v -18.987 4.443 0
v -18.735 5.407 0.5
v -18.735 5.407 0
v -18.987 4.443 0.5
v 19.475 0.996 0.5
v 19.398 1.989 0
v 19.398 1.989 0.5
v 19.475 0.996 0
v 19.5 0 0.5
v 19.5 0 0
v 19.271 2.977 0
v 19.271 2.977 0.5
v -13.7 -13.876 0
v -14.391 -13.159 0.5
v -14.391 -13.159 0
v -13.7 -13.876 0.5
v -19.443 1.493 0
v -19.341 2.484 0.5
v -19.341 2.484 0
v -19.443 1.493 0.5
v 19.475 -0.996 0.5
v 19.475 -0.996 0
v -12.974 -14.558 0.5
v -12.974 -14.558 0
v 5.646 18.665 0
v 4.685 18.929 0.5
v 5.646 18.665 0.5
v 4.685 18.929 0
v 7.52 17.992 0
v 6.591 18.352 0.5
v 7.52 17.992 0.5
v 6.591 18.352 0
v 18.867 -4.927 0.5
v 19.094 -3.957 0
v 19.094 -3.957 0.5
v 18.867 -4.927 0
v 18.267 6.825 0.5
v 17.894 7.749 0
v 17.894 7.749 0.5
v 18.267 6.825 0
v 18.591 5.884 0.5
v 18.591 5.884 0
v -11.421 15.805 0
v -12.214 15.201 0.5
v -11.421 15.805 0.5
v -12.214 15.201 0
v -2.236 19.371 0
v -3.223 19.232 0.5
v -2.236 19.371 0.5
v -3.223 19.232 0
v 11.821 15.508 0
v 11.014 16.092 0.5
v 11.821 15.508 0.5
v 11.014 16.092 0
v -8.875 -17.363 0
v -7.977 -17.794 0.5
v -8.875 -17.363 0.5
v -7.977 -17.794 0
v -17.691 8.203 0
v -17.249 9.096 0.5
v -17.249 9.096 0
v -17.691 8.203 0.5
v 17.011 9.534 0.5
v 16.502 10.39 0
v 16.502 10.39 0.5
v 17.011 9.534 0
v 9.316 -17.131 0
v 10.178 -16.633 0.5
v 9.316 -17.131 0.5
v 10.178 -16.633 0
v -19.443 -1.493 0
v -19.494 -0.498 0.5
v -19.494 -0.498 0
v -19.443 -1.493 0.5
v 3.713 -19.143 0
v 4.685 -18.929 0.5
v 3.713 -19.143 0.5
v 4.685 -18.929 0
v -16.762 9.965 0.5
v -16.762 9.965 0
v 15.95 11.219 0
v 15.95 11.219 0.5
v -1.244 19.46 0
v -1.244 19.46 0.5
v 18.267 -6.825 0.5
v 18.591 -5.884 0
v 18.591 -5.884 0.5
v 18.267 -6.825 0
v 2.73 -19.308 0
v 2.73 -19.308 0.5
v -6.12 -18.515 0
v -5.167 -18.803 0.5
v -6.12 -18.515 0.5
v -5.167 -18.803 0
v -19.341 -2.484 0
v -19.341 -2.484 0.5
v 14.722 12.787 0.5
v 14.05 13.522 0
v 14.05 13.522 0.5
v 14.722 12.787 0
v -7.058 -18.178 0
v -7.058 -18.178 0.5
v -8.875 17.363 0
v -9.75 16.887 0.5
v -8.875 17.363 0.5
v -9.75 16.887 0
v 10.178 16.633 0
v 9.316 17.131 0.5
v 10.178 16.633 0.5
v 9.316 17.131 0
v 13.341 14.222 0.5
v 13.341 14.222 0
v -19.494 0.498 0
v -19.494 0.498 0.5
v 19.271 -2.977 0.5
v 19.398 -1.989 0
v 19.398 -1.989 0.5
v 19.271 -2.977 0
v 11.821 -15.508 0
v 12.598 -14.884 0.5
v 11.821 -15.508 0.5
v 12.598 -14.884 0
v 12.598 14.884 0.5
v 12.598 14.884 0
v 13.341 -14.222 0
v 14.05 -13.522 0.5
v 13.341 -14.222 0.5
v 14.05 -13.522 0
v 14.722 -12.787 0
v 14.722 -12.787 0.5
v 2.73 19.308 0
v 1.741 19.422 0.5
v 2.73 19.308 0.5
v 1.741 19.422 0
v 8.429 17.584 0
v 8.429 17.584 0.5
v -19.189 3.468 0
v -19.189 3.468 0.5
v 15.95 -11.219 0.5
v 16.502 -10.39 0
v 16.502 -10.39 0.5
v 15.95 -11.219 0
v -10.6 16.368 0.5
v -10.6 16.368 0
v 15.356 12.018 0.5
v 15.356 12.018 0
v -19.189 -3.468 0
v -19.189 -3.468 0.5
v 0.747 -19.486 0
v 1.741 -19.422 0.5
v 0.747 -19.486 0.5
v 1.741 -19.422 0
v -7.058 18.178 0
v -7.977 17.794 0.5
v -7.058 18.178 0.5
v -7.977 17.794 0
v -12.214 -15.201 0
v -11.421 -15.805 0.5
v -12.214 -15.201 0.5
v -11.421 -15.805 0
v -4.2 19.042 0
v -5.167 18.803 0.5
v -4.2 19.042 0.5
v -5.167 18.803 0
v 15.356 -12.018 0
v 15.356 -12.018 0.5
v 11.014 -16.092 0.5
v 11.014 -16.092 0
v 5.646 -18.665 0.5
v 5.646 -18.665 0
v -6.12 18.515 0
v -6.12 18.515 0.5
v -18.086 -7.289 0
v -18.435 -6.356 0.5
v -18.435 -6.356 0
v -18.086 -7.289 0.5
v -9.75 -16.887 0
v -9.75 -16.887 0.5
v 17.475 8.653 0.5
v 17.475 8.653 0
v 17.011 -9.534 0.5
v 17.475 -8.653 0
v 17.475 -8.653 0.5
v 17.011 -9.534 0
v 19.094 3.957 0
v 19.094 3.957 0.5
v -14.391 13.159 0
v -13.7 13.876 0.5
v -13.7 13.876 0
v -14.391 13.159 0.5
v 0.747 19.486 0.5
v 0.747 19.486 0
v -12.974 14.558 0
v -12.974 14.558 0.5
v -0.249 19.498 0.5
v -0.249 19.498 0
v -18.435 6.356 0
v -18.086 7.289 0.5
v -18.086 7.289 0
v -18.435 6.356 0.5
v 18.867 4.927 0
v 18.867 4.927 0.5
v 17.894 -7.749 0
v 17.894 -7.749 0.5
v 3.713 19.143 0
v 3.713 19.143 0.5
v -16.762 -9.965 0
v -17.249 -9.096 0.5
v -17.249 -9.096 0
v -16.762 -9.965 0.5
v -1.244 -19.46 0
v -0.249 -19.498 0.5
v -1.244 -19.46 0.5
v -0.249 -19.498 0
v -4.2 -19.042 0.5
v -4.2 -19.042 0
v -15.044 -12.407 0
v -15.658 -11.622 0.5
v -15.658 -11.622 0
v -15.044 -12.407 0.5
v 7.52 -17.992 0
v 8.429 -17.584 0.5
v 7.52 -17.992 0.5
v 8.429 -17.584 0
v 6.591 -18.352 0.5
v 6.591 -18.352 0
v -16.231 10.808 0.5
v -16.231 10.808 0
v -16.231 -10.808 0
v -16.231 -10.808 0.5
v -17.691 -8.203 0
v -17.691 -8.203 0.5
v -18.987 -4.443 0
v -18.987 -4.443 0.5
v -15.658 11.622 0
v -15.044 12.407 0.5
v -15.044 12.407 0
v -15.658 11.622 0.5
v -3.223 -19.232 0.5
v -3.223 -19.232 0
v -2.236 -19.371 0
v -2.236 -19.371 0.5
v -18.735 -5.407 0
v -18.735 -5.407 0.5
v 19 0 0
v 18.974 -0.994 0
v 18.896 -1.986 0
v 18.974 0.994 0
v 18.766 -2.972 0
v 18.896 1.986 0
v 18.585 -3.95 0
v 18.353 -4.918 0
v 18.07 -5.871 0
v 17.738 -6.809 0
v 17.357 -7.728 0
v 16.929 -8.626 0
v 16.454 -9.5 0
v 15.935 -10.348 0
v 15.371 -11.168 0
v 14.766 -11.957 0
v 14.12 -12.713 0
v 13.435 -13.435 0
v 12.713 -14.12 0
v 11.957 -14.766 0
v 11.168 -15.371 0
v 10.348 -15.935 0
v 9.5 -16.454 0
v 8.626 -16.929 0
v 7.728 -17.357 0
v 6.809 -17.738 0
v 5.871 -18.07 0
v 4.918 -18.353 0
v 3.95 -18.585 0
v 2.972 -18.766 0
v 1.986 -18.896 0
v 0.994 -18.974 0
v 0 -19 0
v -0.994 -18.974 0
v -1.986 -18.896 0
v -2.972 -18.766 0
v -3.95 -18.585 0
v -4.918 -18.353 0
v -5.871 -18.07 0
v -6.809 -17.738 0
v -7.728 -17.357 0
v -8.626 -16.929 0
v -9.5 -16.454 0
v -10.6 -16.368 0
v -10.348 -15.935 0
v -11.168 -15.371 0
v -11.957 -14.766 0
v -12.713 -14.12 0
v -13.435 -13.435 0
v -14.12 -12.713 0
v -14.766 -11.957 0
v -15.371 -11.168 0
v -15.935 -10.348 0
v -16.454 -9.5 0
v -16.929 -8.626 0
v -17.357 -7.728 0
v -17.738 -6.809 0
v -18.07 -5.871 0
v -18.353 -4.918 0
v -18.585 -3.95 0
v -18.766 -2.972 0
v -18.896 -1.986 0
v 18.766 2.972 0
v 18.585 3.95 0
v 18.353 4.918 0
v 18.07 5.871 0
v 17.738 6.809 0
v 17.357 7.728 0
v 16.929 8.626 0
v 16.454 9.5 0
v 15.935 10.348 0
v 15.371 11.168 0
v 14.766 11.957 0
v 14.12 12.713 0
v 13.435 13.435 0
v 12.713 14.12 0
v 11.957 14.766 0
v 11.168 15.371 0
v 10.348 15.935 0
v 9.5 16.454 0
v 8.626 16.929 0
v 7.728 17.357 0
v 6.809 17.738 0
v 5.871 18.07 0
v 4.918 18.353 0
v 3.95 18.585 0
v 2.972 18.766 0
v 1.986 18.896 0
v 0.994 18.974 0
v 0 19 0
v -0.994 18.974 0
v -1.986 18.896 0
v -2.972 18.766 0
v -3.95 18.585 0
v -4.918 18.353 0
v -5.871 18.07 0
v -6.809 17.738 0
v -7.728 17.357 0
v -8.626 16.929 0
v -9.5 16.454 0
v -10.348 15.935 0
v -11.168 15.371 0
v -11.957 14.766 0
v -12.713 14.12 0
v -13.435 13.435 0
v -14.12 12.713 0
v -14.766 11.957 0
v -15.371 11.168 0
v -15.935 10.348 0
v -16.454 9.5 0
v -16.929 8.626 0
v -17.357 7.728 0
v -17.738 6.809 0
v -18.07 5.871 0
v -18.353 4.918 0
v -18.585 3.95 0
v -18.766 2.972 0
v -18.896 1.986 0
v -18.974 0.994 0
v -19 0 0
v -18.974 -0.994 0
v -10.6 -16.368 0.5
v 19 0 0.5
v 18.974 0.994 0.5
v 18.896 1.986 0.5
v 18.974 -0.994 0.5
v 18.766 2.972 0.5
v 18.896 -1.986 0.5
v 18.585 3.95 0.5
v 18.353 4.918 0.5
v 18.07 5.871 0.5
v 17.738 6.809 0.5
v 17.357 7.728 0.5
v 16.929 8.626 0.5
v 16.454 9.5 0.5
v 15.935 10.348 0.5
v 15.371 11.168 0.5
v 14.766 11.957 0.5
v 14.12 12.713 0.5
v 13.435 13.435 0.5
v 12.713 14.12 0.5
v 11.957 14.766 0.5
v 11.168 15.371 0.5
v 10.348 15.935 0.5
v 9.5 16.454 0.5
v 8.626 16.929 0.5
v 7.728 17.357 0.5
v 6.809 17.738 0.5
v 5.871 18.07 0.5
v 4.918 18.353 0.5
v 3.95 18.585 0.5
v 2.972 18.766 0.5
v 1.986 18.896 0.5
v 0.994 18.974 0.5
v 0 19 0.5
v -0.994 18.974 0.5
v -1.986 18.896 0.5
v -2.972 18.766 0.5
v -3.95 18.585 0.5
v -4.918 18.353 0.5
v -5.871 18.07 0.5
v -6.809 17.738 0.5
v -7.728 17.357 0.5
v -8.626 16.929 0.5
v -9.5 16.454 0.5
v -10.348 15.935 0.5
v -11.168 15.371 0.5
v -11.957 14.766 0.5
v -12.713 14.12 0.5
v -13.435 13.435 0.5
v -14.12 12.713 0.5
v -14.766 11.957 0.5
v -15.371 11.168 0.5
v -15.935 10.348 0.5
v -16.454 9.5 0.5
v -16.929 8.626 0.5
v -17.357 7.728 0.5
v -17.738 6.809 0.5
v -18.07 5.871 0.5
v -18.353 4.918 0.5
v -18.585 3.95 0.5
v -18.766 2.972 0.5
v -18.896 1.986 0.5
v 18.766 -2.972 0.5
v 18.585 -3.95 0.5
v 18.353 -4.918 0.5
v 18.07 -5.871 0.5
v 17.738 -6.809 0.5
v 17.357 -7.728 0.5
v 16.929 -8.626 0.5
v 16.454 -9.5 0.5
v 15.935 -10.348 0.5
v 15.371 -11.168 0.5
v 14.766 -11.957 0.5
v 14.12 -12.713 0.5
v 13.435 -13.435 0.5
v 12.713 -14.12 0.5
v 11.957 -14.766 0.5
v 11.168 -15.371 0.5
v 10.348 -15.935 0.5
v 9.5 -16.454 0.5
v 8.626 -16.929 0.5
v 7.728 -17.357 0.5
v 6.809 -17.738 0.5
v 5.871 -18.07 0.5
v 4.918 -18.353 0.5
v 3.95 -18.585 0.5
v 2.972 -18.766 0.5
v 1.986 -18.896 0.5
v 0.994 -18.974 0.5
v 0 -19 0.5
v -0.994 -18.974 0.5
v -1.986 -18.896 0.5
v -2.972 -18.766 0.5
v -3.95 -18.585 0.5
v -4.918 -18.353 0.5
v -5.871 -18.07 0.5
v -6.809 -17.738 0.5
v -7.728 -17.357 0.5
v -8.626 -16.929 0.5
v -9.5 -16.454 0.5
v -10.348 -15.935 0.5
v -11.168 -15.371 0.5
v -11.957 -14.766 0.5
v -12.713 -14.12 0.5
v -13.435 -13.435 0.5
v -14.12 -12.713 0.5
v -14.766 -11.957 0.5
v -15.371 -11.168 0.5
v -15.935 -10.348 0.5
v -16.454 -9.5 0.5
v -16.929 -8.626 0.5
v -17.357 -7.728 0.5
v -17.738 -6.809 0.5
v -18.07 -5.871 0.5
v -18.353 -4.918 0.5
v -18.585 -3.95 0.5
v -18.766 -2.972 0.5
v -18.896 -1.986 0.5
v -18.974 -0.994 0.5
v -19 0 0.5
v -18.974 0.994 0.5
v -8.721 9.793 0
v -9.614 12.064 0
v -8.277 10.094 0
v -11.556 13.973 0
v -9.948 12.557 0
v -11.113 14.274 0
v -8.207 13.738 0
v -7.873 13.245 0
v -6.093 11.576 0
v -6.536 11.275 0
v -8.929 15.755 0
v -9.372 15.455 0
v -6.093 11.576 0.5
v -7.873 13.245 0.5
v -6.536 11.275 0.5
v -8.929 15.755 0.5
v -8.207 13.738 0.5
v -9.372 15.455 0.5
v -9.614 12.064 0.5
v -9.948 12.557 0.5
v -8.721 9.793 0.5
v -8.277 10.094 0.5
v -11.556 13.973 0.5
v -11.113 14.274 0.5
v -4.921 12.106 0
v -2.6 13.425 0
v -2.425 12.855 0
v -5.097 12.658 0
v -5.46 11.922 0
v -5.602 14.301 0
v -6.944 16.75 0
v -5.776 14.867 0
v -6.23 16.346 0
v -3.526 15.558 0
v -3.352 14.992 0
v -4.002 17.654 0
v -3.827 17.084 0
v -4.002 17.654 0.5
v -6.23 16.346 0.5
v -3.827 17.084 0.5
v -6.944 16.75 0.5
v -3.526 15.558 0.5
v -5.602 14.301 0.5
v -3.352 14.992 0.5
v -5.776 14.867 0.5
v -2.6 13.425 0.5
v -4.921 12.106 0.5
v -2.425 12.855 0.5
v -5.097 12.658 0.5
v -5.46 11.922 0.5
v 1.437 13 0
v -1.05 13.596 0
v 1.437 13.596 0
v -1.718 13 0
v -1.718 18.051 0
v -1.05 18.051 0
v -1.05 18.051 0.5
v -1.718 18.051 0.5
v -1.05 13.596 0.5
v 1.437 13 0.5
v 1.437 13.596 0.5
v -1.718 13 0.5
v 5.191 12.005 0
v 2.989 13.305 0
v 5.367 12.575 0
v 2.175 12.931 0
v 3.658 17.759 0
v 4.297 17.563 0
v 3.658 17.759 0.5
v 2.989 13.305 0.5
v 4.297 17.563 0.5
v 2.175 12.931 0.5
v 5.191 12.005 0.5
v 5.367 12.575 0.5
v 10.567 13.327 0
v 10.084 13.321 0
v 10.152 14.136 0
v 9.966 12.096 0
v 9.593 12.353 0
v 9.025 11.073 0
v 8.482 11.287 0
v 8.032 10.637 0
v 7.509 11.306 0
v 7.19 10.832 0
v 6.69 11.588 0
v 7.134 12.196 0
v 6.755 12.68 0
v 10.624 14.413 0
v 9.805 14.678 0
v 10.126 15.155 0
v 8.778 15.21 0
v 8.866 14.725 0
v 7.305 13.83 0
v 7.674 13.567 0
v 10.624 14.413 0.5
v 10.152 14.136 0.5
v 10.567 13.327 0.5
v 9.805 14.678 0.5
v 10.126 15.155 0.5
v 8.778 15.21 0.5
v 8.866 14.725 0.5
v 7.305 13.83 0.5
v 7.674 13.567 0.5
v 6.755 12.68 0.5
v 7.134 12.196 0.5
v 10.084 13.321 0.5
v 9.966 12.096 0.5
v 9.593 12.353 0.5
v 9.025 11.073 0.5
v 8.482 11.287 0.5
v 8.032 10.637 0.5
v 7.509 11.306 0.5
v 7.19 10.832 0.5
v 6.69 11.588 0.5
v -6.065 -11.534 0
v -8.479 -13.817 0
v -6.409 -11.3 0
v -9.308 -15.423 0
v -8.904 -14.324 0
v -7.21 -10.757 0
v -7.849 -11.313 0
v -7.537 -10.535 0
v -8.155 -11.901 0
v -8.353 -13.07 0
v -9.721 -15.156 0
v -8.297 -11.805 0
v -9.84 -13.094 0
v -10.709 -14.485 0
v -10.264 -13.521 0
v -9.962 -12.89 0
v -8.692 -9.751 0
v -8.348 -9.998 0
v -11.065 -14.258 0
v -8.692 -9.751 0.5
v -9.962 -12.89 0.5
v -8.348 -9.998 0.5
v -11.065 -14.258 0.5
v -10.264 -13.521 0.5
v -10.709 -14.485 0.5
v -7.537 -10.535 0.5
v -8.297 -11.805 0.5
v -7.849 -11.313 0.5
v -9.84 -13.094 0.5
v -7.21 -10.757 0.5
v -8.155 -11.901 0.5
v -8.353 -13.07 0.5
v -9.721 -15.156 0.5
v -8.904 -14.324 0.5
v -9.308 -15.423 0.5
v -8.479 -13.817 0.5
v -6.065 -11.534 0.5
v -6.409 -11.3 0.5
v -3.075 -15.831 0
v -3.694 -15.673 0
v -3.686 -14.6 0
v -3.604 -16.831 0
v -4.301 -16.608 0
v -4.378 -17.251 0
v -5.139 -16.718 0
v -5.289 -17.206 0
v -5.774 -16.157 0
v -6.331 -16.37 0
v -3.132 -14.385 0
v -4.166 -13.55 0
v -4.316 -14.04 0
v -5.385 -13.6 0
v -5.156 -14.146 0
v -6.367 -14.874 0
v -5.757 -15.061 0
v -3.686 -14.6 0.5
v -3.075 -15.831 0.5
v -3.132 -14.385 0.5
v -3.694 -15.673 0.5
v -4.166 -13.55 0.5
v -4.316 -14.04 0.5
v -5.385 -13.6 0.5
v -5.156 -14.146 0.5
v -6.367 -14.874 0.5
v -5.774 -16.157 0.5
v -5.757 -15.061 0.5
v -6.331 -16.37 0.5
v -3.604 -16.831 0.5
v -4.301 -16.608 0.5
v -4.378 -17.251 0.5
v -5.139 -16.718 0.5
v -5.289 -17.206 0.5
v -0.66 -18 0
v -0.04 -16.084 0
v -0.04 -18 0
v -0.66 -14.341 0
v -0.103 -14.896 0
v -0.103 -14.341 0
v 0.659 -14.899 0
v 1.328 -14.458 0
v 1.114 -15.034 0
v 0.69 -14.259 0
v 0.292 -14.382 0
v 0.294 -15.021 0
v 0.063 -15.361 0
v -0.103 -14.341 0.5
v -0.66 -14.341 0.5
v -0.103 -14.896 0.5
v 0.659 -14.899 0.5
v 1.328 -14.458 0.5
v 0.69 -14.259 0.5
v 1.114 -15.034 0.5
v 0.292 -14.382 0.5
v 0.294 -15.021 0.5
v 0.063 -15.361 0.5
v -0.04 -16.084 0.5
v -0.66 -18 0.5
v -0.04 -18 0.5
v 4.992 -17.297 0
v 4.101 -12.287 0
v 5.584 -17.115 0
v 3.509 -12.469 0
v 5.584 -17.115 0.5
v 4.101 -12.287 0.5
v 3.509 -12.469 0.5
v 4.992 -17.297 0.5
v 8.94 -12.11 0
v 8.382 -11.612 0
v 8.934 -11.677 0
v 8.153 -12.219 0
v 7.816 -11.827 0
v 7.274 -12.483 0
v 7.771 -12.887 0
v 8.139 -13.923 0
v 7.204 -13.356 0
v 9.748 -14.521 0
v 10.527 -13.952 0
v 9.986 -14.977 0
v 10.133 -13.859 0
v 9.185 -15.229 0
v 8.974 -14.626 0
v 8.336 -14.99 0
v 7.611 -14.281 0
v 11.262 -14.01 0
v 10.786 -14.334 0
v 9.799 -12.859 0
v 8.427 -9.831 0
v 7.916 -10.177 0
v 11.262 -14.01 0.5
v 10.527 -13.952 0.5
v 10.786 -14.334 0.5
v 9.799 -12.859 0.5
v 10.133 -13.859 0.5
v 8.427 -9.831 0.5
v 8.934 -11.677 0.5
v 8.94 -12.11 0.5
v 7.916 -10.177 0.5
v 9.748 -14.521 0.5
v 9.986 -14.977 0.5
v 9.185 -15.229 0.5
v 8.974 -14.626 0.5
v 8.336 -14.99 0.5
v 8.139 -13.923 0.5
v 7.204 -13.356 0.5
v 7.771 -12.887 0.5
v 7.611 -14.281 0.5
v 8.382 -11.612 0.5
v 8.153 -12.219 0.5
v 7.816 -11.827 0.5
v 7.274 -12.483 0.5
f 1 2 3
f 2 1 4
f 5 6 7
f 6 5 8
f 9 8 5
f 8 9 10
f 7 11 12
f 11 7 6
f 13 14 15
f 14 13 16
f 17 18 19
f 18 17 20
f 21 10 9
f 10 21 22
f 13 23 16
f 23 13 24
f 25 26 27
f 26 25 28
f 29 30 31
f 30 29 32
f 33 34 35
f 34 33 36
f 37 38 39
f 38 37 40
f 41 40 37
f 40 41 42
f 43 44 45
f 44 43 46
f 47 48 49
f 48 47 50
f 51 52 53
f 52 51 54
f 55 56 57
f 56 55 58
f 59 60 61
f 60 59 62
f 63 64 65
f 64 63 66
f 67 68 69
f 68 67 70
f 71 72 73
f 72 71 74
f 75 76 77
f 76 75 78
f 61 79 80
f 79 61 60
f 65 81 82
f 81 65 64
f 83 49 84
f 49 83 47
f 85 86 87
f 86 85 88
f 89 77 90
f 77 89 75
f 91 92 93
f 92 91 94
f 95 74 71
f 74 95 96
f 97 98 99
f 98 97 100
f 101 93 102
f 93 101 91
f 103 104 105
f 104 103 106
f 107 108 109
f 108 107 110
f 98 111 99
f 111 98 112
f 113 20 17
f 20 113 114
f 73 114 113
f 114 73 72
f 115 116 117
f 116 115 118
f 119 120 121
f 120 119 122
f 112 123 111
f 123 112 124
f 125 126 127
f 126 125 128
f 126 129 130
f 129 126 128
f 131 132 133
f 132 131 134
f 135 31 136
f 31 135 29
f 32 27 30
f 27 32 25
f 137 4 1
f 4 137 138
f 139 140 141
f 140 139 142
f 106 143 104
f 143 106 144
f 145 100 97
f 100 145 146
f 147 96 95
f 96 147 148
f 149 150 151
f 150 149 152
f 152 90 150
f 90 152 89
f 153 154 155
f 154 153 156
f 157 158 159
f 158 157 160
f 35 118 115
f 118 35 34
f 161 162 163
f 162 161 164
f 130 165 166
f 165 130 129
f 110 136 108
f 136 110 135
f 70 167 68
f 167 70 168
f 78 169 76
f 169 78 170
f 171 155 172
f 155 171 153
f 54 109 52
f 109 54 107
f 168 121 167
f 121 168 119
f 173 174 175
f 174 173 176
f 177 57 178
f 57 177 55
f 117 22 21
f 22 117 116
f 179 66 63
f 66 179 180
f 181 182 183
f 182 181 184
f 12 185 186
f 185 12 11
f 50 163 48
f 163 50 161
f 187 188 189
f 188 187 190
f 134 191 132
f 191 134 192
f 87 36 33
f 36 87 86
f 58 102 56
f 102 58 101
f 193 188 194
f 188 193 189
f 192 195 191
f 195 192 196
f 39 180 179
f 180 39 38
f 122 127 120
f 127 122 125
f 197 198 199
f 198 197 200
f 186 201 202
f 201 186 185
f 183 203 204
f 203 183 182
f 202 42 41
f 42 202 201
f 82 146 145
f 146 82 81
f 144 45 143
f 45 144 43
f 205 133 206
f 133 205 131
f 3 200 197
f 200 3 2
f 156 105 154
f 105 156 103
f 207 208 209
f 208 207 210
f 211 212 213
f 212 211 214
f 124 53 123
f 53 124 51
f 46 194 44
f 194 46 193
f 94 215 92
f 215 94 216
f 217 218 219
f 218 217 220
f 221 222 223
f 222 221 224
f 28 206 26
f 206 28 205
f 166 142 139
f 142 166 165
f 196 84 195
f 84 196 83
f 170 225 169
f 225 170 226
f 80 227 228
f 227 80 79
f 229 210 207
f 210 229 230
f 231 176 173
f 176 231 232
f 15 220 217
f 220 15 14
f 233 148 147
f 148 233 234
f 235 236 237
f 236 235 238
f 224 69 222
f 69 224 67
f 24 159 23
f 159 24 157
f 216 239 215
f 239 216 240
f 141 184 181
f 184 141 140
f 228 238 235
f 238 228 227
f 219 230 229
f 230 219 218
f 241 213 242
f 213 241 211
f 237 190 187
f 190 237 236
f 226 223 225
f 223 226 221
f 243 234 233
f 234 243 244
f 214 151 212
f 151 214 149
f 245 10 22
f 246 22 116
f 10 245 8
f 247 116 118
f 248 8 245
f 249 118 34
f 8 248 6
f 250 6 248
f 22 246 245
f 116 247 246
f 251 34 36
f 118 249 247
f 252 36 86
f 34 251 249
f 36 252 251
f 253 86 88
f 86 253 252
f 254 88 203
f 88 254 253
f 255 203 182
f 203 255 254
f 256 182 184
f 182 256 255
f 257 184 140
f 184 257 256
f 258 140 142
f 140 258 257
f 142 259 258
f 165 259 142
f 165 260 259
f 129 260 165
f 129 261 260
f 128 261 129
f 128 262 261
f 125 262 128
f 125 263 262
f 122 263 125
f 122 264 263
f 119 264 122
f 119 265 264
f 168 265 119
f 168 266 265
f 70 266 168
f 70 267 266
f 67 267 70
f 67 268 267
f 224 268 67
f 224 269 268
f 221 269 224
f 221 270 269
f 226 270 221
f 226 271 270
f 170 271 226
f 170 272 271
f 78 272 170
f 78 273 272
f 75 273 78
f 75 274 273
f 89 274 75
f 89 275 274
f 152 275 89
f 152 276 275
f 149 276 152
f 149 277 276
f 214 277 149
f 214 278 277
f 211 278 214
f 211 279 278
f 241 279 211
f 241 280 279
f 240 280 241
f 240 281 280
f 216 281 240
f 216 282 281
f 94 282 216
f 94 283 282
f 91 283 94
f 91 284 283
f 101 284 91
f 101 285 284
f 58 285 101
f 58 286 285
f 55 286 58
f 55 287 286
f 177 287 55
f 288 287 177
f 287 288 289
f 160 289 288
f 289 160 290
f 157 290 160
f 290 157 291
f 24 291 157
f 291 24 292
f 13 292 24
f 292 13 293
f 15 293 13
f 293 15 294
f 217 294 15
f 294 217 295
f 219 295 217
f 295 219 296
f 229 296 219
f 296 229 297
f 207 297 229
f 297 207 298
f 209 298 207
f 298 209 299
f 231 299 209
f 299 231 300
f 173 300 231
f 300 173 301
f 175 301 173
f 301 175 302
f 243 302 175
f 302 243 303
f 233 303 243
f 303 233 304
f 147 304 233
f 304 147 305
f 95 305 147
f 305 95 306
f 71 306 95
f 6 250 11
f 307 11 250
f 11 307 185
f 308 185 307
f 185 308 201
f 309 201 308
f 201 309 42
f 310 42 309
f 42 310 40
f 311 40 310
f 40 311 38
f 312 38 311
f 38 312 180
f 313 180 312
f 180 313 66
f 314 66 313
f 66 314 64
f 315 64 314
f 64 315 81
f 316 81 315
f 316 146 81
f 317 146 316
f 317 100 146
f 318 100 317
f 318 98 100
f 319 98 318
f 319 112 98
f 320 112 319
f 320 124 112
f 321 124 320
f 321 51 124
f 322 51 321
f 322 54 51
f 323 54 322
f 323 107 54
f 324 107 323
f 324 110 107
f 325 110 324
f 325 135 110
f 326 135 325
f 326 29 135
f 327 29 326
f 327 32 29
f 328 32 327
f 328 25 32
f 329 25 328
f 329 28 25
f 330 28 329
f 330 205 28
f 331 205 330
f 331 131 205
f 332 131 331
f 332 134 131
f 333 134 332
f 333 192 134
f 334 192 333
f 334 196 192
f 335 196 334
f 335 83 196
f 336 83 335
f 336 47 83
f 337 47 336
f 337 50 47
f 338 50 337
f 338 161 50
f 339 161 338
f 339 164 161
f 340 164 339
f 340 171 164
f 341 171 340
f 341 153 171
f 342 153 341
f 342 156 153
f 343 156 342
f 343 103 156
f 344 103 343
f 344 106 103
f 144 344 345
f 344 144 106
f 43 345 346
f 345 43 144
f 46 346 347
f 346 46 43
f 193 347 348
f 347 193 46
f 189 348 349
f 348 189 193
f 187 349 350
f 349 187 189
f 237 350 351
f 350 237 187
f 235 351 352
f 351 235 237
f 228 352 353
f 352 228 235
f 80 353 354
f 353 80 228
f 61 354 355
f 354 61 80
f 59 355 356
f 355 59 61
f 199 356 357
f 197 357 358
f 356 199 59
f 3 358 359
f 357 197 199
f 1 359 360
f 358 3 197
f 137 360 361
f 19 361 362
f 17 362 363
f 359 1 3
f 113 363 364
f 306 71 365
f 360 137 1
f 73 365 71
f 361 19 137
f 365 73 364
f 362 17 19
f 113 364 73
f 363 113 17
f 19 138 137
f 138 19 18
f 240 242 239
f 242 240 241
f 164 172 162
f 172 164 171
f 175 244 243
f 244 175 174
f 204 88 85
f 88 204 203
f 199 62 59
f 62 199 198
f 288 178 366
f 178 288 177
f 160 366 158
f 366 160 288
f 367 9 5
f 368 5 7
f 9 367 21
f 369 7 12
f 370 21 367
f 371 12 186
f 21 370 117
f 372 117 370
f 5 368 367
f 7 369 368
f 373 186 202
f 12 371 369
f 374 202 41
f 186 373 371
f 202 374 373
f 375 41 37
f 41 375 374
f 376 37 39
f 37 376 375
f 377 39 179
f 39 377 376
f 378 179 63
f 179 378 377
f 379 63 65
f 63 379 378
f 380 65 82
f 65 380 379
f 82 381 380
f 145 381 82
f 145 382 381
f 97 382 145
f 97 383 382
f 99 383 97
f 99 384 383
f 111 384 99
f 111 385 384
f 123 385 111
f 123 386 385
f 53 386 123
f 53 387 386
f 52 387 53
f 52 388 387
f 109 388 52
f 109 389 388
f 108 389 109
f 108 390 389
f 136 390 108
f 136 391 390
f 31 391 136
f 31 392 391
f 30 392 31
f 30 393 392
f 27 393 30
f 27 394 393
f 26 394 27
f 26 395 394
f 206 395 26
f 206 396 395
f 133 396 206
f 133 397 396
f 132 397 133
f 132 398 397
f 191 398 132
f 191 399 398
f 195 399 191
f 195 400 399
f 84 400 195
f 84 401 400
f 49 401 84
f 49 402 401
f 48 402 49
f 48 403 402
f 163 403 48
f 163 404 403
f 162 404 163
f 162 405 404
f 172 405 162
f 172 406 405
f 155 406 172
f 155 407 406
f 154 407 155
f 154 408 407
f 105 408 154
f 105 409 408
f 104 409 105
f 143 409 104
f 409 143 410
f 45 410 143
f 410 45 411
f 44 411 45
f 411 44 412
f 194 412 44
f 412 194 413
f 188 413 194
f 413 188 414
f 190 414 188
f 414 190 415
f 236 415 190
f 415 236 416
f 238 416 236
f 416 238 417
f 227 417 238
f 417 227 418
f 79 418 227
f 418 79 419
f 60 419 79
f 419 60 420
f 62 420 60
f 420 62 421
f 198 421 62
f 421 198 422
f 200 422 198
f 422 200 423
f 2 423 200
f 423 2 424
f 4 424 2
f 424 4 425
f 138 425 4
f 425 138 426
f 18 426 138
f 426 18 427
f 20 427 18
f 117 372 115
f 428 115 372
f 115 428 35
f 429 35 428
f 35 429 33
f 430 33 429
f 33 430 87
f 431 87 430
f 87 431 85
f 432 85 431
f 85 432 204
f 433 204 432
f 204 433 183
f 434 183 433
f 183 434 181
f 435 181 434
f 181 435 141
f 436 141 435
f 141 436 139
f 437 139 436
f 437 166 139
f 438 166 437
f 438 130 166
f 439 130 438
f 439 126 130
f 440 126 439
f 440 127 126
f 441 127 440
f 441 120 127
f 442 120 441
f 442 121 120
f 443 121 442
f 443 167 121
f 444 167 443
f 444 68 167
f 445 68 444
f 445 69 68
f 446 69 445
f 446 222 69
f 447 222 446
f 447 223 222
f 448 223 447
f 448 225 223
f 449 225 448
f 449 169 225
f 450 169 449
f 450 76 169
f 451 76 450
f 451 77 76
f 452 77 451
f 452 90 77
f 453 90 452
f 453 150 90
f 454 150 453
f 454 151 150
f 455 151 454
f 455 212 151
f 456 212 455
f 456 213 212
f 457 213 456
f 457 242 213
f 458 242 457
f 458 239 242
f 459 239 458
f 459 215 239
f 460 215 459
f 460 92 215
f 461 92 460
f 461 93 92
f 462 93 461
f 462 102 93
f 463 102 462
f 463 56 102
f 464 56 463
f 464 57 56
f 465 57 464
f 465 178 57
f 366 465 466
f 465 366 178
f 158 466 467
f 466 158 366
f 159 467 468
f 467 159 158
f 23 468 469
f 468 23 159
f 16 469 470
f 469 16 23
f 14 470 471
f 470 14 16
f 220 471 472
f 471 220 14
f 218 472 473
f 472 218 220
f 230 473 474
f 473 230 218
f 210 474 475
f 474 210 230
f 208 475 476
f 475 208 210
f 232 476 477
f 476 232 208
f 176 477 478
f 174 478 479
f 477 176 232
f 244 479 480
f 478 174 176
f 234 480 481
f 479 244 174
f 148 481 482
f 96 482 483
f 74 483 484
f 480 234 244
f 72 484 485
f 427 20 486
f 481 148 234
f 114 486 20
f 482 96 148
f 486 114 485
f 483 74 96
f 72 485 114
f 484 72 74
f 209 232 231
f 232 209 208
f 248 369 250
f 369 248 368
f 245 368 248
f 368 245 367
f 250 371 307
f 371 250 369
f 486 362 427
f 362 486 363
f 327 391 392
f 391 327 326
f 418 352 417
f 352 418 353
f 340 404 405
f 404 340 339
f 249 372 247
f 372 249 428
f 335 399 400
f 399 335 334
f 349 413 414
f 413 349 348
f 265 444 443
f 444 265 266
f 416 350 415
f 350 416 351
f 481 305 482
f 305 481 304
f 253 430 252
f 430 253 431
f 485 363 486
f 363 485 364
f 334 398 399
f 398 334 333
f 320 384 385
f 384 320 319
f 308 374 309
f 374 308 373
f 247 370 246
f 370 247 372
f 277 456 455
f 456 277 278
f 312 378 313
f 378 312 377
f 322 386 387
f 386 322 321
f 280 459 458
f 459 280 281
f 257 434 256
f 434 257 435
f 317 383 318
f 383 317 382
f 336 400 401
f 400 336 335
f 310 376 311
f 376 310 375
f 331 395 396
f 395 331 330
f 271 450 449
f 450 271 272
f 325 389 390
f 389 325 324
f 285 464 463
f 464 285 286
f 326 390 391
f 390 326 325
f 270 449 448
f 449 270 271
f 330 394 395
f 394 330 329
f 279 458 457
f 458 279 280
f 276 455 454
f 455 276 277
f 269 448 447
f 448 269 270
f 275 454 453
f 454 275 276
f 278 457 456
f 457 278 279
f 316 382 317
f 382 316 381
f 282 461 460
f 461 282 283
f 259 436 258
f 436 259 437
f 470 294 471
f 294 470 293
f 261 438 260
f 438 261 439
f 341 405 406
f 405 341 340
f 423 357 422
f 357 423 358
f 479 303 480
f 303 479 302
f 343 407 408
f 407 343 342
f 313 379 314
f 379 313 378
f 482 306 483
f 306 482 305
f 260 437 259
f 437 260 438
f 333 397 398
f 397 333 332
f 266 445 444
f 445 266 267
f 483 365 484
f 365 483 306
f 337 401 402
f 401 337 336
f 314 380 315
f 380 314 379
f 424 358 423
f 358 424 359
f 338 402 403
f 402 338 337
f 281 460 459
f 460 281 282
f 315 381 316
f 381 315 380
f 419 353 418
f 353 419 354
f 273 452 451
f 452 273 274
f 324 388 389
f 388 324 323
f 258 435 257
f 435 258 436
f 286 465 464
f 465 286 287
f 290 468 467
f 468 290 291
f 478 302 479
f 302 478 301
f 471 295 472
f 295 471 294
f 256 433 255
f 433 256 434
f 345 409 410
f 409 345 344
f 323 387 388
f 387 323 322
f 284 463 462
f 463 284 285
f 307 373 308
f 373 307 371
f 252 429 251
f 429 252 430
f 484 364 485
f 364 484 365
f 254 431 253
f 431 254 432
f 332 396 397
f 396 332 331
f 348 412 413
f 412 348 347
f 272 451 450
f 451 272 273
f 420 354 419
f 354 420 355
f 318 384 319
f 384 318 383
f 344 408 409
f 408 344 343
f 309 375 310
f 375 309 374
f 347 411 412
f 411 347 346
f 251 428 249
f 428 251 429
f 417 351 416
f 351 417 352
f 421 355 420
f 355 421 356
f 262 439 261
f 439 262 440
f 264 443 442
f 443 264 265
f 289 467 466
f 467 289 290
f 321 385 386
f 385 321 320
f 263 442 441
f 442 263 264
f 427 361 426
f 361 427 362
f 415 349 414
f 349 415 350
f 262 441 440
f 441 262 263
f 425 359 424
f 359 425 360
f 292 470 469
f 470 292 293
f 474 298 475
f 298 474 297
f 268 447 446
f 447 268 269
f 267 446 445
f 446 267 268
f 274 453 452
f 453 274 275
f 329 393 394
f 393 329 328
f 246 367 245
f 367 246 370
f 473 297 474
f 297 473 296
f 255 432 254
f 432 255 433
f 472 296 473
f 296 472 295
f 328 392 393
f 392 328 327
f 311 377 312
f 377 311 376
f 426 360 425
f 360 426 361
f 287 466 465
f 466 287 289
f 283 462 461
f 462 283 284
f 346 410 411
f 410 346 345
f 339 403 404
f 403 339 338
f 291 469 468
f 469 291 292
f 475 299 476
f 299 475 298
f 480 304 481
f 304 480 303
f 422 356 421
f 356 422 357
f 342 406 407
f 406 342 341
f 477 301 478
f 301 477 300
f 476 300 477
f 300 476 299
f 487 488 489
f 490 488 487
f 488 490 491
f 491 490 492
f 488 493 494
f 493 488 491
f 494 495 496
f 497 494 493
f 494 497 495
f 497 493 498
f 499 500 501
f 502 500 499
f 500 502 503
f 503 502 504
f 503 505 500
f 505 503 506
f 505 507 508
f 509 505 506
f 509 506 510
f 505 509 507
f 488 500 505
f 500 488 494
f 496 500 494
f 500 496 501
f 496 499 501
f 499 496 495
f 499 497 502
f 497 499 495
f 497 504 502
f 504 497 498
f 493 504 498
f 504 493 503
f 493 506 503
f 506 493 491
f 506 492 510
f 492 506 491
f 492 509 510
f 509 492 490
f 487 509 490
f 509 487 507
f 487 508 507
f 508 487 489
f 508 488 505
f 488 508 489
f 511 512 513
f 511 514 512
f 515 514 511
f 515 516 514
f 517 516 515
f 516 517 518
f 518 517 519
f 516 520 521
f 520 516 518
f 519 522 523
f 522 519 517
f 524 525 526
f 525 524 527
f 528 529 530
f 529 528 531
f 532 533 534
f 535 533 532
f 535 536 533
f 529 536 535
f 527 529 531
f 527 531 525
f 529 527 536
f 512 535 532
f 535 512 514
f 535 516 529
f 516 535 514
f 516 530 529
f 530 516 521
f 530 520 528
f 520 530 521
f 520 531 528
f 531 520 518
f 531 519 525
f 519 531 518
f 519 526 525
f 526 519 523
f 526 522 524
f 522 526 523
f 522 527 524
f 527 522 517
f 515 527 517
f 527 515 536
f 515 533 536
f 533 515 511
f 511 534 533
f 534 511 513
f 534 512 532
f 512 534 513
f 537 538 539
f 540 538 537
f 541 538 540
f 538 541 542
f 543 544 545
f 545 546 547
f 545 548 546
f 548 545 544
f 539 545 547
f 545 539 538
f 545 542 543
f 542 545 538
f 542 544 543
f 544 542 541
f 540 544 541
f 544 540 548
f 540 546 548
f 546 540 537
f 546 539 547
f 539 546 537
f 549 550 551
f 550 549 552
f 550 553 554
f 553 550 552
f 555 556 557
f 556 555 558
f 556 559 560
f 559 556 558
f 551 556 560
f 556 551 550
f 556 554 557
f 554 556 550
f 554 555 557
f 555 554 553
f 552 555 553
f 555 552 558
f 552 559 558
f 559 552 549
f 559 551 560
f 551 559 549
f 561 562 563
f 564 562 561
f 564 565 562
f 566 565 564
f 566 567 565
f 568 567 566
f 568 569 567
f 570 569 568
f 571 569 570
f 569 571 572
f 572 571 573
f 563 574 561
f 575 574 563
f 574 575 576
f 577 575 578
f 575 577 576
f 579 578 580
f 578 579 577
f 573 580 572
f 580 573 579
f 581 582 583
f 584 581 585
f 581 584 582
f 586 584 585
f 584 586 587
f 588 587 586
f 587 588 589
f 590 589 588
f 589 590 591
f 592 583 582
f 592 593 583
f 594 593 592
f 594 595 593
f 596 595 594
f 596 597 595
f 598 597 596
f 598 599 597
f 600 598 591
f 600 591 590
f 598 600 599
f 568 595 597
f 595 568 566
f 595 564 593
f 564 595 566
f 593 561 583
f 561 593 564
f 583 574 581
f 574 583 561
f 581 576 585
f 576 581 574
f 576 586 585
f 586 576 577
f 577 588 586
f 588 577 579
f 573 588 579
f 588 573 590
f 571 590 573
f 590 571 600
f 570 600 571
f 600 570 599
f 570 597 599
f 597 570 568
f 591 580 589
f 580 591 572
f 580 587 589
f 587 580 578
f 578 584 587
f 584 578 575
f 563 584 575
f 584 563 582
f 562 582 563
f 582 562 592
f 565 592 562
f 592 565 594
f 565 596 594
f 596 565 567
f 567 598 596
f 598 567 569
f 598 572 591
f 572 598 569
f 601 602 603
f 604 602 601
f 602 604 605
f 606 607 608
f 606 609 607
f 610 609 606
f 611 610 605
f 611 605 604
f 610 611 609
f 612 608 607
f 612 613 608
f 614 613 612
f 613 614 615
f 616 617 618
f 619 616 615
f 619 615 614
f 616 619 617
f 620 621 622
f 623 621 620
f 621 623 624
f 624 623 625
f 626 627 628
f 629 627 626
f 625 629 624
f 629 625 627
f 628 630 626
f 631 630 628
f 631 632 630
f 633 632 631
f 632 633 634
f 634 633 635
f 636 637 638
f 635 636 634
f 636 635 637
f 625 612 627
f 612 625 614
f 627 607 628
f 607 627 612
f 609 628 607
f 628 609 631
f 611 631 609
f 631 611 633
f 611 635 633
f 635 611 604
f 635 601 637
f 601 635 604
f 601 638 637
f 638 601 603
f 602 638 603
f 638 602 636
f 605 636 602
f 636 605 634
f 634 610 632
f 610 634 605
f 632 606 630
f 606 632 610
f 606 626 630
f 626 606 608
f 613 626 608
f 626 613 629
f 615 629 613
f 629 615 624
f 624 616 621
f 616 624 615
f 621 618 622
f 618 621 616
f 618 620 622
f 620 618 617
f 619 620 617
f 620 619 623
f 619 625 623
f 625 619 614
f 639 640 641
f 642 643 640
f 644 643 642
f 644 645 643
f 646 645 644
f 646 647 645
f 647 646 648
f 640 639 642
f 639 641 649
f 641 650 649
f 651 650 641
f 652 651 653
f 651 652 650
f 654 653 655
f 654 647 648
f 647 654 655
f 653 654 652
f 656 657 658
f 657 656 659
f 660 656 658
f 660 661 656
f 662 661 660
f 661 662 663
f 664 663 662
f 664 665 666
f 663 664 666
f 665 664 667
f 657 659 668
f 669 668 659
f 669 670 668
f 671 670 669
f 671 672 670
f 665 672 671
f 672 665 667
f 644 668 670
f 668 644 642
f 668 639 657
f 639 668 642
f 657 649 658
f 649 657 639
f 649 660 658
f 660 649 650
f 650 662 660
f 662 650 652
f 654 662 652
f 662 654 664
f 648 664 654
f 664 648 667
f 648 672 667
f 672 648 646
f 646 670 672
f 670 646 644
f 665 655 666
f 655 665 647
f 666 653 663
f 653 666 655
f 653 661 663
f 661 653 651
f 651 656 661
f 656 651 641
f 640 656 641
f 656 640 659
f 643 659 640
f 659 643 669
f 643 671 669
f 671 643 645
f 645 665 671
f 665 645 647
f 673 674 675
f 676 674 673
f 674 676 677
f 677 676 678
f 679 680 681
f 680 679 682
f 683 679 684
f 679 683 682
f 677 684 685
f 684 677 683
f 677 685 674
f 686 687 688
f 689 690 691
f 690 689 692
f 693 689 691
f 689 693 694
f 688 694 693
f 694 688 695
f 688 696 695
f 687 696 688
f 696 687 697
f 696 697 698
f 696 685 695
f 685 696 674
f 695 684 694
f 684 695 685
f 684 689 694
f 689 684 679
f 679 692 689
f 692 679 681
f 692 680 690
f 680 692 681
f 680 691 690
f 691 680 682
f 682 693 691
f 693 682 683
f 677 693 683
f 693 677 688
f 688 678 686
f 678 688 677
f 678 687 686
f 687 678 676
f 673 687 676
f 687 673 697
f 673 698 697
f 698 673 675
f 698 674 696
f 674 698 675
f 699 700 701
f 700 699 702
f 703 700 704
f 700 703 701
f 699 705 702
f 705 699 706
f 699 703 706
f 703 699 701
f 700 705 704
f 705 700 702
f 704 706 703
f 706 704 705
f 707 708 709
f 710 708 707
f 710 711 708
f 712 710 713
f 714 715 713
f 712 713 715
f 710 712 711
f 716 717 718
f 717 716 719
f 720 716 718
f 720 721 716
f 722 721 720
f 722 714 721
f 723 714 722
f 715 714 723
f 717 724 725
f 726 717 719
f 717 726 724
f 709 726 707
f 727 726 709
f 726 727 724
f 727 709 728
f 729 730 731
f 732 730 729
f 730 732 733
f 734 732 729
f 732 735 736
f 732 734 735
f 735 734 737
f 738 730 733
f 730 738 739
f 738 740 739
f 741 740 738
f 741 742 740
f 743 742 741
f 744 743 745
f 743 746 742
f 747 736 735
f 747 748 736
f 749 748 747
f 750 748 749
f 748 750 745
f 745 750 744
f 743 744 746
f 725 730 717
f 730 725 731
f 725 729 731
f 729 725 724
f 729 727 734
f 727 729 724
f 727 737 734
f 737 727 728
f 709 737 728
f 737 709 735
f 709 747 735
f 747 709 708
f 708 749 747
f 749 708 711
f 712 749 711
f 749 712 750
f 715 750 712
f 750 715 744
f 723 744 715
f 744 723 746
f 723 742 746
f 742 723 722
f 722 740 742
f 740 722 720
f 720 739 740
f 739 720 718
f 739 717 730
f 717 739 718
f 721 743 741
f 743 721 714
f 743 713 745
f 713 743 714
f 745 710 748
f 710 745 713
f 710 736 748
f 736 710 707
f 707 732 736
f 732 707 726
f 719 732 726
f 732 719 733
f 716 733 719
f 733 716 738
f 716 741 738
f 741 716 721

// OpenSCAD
// Challenge coin generator.
// All dimensions in millimeters.

use <write.scad>

// Epsilon
E = 0.01;


module coin(
       top_text="",      // Text of centered top text
       bottom_text="",   // Text of centered bottom text
       size=39,          // Diameter of coin
       thickness=3.2,    // Total coin thickness
       relief=0.5,       // Height of raised (relief) features
       text_height=5.0,  // Height of a text letter
       rim_width=0.5     // Rim edge thickness
       ) {
  ring(r=size / 2, thickness=rim_width, height=relief);
  arc_text(text=top_text, text_height=text_height, height=relief,
           r=size / 2 - rim_width * 3, top=true);
  arc_text(text=bottom_text, text_height=text_height, height=relief,
           r=size / 2 - rim_width * 3, top=false);
}

module arc_text(text, text_height, height, r, top=true) {
  ang = 1.1 * atan2(text_height, r);
  start_ang = (len(text) - 1) / 2 * ang;
  ang_sgn = top ? -1 : 1;
  offset_sgn = top ? 1 : -1;
  for (i = [0 : len(text) - 1]) {
    rotate(a=ang_sgn * (ang * i - start_ang), v=[0, 0, 1])
      translate([0, offset_sgn * (r - text_height / 2), height / 2])
        write(text[i], h=text_height, t=height, center=true, font="Letters.dxf");
  }
}

// Ring around origin (at z=0)
module ring(r, thickness, height) {
  translate([0, 0, height / 2]) {
    difference() {
      cylinder(h=height, r=r, $fa=1, $fs=1, center=true);
      cylinder(h=height + E, r=r - thickness, $fa=1, $fs=1, center=true);
    }
  }
}

coin(top_text="HELLO", bottom_text="World");
